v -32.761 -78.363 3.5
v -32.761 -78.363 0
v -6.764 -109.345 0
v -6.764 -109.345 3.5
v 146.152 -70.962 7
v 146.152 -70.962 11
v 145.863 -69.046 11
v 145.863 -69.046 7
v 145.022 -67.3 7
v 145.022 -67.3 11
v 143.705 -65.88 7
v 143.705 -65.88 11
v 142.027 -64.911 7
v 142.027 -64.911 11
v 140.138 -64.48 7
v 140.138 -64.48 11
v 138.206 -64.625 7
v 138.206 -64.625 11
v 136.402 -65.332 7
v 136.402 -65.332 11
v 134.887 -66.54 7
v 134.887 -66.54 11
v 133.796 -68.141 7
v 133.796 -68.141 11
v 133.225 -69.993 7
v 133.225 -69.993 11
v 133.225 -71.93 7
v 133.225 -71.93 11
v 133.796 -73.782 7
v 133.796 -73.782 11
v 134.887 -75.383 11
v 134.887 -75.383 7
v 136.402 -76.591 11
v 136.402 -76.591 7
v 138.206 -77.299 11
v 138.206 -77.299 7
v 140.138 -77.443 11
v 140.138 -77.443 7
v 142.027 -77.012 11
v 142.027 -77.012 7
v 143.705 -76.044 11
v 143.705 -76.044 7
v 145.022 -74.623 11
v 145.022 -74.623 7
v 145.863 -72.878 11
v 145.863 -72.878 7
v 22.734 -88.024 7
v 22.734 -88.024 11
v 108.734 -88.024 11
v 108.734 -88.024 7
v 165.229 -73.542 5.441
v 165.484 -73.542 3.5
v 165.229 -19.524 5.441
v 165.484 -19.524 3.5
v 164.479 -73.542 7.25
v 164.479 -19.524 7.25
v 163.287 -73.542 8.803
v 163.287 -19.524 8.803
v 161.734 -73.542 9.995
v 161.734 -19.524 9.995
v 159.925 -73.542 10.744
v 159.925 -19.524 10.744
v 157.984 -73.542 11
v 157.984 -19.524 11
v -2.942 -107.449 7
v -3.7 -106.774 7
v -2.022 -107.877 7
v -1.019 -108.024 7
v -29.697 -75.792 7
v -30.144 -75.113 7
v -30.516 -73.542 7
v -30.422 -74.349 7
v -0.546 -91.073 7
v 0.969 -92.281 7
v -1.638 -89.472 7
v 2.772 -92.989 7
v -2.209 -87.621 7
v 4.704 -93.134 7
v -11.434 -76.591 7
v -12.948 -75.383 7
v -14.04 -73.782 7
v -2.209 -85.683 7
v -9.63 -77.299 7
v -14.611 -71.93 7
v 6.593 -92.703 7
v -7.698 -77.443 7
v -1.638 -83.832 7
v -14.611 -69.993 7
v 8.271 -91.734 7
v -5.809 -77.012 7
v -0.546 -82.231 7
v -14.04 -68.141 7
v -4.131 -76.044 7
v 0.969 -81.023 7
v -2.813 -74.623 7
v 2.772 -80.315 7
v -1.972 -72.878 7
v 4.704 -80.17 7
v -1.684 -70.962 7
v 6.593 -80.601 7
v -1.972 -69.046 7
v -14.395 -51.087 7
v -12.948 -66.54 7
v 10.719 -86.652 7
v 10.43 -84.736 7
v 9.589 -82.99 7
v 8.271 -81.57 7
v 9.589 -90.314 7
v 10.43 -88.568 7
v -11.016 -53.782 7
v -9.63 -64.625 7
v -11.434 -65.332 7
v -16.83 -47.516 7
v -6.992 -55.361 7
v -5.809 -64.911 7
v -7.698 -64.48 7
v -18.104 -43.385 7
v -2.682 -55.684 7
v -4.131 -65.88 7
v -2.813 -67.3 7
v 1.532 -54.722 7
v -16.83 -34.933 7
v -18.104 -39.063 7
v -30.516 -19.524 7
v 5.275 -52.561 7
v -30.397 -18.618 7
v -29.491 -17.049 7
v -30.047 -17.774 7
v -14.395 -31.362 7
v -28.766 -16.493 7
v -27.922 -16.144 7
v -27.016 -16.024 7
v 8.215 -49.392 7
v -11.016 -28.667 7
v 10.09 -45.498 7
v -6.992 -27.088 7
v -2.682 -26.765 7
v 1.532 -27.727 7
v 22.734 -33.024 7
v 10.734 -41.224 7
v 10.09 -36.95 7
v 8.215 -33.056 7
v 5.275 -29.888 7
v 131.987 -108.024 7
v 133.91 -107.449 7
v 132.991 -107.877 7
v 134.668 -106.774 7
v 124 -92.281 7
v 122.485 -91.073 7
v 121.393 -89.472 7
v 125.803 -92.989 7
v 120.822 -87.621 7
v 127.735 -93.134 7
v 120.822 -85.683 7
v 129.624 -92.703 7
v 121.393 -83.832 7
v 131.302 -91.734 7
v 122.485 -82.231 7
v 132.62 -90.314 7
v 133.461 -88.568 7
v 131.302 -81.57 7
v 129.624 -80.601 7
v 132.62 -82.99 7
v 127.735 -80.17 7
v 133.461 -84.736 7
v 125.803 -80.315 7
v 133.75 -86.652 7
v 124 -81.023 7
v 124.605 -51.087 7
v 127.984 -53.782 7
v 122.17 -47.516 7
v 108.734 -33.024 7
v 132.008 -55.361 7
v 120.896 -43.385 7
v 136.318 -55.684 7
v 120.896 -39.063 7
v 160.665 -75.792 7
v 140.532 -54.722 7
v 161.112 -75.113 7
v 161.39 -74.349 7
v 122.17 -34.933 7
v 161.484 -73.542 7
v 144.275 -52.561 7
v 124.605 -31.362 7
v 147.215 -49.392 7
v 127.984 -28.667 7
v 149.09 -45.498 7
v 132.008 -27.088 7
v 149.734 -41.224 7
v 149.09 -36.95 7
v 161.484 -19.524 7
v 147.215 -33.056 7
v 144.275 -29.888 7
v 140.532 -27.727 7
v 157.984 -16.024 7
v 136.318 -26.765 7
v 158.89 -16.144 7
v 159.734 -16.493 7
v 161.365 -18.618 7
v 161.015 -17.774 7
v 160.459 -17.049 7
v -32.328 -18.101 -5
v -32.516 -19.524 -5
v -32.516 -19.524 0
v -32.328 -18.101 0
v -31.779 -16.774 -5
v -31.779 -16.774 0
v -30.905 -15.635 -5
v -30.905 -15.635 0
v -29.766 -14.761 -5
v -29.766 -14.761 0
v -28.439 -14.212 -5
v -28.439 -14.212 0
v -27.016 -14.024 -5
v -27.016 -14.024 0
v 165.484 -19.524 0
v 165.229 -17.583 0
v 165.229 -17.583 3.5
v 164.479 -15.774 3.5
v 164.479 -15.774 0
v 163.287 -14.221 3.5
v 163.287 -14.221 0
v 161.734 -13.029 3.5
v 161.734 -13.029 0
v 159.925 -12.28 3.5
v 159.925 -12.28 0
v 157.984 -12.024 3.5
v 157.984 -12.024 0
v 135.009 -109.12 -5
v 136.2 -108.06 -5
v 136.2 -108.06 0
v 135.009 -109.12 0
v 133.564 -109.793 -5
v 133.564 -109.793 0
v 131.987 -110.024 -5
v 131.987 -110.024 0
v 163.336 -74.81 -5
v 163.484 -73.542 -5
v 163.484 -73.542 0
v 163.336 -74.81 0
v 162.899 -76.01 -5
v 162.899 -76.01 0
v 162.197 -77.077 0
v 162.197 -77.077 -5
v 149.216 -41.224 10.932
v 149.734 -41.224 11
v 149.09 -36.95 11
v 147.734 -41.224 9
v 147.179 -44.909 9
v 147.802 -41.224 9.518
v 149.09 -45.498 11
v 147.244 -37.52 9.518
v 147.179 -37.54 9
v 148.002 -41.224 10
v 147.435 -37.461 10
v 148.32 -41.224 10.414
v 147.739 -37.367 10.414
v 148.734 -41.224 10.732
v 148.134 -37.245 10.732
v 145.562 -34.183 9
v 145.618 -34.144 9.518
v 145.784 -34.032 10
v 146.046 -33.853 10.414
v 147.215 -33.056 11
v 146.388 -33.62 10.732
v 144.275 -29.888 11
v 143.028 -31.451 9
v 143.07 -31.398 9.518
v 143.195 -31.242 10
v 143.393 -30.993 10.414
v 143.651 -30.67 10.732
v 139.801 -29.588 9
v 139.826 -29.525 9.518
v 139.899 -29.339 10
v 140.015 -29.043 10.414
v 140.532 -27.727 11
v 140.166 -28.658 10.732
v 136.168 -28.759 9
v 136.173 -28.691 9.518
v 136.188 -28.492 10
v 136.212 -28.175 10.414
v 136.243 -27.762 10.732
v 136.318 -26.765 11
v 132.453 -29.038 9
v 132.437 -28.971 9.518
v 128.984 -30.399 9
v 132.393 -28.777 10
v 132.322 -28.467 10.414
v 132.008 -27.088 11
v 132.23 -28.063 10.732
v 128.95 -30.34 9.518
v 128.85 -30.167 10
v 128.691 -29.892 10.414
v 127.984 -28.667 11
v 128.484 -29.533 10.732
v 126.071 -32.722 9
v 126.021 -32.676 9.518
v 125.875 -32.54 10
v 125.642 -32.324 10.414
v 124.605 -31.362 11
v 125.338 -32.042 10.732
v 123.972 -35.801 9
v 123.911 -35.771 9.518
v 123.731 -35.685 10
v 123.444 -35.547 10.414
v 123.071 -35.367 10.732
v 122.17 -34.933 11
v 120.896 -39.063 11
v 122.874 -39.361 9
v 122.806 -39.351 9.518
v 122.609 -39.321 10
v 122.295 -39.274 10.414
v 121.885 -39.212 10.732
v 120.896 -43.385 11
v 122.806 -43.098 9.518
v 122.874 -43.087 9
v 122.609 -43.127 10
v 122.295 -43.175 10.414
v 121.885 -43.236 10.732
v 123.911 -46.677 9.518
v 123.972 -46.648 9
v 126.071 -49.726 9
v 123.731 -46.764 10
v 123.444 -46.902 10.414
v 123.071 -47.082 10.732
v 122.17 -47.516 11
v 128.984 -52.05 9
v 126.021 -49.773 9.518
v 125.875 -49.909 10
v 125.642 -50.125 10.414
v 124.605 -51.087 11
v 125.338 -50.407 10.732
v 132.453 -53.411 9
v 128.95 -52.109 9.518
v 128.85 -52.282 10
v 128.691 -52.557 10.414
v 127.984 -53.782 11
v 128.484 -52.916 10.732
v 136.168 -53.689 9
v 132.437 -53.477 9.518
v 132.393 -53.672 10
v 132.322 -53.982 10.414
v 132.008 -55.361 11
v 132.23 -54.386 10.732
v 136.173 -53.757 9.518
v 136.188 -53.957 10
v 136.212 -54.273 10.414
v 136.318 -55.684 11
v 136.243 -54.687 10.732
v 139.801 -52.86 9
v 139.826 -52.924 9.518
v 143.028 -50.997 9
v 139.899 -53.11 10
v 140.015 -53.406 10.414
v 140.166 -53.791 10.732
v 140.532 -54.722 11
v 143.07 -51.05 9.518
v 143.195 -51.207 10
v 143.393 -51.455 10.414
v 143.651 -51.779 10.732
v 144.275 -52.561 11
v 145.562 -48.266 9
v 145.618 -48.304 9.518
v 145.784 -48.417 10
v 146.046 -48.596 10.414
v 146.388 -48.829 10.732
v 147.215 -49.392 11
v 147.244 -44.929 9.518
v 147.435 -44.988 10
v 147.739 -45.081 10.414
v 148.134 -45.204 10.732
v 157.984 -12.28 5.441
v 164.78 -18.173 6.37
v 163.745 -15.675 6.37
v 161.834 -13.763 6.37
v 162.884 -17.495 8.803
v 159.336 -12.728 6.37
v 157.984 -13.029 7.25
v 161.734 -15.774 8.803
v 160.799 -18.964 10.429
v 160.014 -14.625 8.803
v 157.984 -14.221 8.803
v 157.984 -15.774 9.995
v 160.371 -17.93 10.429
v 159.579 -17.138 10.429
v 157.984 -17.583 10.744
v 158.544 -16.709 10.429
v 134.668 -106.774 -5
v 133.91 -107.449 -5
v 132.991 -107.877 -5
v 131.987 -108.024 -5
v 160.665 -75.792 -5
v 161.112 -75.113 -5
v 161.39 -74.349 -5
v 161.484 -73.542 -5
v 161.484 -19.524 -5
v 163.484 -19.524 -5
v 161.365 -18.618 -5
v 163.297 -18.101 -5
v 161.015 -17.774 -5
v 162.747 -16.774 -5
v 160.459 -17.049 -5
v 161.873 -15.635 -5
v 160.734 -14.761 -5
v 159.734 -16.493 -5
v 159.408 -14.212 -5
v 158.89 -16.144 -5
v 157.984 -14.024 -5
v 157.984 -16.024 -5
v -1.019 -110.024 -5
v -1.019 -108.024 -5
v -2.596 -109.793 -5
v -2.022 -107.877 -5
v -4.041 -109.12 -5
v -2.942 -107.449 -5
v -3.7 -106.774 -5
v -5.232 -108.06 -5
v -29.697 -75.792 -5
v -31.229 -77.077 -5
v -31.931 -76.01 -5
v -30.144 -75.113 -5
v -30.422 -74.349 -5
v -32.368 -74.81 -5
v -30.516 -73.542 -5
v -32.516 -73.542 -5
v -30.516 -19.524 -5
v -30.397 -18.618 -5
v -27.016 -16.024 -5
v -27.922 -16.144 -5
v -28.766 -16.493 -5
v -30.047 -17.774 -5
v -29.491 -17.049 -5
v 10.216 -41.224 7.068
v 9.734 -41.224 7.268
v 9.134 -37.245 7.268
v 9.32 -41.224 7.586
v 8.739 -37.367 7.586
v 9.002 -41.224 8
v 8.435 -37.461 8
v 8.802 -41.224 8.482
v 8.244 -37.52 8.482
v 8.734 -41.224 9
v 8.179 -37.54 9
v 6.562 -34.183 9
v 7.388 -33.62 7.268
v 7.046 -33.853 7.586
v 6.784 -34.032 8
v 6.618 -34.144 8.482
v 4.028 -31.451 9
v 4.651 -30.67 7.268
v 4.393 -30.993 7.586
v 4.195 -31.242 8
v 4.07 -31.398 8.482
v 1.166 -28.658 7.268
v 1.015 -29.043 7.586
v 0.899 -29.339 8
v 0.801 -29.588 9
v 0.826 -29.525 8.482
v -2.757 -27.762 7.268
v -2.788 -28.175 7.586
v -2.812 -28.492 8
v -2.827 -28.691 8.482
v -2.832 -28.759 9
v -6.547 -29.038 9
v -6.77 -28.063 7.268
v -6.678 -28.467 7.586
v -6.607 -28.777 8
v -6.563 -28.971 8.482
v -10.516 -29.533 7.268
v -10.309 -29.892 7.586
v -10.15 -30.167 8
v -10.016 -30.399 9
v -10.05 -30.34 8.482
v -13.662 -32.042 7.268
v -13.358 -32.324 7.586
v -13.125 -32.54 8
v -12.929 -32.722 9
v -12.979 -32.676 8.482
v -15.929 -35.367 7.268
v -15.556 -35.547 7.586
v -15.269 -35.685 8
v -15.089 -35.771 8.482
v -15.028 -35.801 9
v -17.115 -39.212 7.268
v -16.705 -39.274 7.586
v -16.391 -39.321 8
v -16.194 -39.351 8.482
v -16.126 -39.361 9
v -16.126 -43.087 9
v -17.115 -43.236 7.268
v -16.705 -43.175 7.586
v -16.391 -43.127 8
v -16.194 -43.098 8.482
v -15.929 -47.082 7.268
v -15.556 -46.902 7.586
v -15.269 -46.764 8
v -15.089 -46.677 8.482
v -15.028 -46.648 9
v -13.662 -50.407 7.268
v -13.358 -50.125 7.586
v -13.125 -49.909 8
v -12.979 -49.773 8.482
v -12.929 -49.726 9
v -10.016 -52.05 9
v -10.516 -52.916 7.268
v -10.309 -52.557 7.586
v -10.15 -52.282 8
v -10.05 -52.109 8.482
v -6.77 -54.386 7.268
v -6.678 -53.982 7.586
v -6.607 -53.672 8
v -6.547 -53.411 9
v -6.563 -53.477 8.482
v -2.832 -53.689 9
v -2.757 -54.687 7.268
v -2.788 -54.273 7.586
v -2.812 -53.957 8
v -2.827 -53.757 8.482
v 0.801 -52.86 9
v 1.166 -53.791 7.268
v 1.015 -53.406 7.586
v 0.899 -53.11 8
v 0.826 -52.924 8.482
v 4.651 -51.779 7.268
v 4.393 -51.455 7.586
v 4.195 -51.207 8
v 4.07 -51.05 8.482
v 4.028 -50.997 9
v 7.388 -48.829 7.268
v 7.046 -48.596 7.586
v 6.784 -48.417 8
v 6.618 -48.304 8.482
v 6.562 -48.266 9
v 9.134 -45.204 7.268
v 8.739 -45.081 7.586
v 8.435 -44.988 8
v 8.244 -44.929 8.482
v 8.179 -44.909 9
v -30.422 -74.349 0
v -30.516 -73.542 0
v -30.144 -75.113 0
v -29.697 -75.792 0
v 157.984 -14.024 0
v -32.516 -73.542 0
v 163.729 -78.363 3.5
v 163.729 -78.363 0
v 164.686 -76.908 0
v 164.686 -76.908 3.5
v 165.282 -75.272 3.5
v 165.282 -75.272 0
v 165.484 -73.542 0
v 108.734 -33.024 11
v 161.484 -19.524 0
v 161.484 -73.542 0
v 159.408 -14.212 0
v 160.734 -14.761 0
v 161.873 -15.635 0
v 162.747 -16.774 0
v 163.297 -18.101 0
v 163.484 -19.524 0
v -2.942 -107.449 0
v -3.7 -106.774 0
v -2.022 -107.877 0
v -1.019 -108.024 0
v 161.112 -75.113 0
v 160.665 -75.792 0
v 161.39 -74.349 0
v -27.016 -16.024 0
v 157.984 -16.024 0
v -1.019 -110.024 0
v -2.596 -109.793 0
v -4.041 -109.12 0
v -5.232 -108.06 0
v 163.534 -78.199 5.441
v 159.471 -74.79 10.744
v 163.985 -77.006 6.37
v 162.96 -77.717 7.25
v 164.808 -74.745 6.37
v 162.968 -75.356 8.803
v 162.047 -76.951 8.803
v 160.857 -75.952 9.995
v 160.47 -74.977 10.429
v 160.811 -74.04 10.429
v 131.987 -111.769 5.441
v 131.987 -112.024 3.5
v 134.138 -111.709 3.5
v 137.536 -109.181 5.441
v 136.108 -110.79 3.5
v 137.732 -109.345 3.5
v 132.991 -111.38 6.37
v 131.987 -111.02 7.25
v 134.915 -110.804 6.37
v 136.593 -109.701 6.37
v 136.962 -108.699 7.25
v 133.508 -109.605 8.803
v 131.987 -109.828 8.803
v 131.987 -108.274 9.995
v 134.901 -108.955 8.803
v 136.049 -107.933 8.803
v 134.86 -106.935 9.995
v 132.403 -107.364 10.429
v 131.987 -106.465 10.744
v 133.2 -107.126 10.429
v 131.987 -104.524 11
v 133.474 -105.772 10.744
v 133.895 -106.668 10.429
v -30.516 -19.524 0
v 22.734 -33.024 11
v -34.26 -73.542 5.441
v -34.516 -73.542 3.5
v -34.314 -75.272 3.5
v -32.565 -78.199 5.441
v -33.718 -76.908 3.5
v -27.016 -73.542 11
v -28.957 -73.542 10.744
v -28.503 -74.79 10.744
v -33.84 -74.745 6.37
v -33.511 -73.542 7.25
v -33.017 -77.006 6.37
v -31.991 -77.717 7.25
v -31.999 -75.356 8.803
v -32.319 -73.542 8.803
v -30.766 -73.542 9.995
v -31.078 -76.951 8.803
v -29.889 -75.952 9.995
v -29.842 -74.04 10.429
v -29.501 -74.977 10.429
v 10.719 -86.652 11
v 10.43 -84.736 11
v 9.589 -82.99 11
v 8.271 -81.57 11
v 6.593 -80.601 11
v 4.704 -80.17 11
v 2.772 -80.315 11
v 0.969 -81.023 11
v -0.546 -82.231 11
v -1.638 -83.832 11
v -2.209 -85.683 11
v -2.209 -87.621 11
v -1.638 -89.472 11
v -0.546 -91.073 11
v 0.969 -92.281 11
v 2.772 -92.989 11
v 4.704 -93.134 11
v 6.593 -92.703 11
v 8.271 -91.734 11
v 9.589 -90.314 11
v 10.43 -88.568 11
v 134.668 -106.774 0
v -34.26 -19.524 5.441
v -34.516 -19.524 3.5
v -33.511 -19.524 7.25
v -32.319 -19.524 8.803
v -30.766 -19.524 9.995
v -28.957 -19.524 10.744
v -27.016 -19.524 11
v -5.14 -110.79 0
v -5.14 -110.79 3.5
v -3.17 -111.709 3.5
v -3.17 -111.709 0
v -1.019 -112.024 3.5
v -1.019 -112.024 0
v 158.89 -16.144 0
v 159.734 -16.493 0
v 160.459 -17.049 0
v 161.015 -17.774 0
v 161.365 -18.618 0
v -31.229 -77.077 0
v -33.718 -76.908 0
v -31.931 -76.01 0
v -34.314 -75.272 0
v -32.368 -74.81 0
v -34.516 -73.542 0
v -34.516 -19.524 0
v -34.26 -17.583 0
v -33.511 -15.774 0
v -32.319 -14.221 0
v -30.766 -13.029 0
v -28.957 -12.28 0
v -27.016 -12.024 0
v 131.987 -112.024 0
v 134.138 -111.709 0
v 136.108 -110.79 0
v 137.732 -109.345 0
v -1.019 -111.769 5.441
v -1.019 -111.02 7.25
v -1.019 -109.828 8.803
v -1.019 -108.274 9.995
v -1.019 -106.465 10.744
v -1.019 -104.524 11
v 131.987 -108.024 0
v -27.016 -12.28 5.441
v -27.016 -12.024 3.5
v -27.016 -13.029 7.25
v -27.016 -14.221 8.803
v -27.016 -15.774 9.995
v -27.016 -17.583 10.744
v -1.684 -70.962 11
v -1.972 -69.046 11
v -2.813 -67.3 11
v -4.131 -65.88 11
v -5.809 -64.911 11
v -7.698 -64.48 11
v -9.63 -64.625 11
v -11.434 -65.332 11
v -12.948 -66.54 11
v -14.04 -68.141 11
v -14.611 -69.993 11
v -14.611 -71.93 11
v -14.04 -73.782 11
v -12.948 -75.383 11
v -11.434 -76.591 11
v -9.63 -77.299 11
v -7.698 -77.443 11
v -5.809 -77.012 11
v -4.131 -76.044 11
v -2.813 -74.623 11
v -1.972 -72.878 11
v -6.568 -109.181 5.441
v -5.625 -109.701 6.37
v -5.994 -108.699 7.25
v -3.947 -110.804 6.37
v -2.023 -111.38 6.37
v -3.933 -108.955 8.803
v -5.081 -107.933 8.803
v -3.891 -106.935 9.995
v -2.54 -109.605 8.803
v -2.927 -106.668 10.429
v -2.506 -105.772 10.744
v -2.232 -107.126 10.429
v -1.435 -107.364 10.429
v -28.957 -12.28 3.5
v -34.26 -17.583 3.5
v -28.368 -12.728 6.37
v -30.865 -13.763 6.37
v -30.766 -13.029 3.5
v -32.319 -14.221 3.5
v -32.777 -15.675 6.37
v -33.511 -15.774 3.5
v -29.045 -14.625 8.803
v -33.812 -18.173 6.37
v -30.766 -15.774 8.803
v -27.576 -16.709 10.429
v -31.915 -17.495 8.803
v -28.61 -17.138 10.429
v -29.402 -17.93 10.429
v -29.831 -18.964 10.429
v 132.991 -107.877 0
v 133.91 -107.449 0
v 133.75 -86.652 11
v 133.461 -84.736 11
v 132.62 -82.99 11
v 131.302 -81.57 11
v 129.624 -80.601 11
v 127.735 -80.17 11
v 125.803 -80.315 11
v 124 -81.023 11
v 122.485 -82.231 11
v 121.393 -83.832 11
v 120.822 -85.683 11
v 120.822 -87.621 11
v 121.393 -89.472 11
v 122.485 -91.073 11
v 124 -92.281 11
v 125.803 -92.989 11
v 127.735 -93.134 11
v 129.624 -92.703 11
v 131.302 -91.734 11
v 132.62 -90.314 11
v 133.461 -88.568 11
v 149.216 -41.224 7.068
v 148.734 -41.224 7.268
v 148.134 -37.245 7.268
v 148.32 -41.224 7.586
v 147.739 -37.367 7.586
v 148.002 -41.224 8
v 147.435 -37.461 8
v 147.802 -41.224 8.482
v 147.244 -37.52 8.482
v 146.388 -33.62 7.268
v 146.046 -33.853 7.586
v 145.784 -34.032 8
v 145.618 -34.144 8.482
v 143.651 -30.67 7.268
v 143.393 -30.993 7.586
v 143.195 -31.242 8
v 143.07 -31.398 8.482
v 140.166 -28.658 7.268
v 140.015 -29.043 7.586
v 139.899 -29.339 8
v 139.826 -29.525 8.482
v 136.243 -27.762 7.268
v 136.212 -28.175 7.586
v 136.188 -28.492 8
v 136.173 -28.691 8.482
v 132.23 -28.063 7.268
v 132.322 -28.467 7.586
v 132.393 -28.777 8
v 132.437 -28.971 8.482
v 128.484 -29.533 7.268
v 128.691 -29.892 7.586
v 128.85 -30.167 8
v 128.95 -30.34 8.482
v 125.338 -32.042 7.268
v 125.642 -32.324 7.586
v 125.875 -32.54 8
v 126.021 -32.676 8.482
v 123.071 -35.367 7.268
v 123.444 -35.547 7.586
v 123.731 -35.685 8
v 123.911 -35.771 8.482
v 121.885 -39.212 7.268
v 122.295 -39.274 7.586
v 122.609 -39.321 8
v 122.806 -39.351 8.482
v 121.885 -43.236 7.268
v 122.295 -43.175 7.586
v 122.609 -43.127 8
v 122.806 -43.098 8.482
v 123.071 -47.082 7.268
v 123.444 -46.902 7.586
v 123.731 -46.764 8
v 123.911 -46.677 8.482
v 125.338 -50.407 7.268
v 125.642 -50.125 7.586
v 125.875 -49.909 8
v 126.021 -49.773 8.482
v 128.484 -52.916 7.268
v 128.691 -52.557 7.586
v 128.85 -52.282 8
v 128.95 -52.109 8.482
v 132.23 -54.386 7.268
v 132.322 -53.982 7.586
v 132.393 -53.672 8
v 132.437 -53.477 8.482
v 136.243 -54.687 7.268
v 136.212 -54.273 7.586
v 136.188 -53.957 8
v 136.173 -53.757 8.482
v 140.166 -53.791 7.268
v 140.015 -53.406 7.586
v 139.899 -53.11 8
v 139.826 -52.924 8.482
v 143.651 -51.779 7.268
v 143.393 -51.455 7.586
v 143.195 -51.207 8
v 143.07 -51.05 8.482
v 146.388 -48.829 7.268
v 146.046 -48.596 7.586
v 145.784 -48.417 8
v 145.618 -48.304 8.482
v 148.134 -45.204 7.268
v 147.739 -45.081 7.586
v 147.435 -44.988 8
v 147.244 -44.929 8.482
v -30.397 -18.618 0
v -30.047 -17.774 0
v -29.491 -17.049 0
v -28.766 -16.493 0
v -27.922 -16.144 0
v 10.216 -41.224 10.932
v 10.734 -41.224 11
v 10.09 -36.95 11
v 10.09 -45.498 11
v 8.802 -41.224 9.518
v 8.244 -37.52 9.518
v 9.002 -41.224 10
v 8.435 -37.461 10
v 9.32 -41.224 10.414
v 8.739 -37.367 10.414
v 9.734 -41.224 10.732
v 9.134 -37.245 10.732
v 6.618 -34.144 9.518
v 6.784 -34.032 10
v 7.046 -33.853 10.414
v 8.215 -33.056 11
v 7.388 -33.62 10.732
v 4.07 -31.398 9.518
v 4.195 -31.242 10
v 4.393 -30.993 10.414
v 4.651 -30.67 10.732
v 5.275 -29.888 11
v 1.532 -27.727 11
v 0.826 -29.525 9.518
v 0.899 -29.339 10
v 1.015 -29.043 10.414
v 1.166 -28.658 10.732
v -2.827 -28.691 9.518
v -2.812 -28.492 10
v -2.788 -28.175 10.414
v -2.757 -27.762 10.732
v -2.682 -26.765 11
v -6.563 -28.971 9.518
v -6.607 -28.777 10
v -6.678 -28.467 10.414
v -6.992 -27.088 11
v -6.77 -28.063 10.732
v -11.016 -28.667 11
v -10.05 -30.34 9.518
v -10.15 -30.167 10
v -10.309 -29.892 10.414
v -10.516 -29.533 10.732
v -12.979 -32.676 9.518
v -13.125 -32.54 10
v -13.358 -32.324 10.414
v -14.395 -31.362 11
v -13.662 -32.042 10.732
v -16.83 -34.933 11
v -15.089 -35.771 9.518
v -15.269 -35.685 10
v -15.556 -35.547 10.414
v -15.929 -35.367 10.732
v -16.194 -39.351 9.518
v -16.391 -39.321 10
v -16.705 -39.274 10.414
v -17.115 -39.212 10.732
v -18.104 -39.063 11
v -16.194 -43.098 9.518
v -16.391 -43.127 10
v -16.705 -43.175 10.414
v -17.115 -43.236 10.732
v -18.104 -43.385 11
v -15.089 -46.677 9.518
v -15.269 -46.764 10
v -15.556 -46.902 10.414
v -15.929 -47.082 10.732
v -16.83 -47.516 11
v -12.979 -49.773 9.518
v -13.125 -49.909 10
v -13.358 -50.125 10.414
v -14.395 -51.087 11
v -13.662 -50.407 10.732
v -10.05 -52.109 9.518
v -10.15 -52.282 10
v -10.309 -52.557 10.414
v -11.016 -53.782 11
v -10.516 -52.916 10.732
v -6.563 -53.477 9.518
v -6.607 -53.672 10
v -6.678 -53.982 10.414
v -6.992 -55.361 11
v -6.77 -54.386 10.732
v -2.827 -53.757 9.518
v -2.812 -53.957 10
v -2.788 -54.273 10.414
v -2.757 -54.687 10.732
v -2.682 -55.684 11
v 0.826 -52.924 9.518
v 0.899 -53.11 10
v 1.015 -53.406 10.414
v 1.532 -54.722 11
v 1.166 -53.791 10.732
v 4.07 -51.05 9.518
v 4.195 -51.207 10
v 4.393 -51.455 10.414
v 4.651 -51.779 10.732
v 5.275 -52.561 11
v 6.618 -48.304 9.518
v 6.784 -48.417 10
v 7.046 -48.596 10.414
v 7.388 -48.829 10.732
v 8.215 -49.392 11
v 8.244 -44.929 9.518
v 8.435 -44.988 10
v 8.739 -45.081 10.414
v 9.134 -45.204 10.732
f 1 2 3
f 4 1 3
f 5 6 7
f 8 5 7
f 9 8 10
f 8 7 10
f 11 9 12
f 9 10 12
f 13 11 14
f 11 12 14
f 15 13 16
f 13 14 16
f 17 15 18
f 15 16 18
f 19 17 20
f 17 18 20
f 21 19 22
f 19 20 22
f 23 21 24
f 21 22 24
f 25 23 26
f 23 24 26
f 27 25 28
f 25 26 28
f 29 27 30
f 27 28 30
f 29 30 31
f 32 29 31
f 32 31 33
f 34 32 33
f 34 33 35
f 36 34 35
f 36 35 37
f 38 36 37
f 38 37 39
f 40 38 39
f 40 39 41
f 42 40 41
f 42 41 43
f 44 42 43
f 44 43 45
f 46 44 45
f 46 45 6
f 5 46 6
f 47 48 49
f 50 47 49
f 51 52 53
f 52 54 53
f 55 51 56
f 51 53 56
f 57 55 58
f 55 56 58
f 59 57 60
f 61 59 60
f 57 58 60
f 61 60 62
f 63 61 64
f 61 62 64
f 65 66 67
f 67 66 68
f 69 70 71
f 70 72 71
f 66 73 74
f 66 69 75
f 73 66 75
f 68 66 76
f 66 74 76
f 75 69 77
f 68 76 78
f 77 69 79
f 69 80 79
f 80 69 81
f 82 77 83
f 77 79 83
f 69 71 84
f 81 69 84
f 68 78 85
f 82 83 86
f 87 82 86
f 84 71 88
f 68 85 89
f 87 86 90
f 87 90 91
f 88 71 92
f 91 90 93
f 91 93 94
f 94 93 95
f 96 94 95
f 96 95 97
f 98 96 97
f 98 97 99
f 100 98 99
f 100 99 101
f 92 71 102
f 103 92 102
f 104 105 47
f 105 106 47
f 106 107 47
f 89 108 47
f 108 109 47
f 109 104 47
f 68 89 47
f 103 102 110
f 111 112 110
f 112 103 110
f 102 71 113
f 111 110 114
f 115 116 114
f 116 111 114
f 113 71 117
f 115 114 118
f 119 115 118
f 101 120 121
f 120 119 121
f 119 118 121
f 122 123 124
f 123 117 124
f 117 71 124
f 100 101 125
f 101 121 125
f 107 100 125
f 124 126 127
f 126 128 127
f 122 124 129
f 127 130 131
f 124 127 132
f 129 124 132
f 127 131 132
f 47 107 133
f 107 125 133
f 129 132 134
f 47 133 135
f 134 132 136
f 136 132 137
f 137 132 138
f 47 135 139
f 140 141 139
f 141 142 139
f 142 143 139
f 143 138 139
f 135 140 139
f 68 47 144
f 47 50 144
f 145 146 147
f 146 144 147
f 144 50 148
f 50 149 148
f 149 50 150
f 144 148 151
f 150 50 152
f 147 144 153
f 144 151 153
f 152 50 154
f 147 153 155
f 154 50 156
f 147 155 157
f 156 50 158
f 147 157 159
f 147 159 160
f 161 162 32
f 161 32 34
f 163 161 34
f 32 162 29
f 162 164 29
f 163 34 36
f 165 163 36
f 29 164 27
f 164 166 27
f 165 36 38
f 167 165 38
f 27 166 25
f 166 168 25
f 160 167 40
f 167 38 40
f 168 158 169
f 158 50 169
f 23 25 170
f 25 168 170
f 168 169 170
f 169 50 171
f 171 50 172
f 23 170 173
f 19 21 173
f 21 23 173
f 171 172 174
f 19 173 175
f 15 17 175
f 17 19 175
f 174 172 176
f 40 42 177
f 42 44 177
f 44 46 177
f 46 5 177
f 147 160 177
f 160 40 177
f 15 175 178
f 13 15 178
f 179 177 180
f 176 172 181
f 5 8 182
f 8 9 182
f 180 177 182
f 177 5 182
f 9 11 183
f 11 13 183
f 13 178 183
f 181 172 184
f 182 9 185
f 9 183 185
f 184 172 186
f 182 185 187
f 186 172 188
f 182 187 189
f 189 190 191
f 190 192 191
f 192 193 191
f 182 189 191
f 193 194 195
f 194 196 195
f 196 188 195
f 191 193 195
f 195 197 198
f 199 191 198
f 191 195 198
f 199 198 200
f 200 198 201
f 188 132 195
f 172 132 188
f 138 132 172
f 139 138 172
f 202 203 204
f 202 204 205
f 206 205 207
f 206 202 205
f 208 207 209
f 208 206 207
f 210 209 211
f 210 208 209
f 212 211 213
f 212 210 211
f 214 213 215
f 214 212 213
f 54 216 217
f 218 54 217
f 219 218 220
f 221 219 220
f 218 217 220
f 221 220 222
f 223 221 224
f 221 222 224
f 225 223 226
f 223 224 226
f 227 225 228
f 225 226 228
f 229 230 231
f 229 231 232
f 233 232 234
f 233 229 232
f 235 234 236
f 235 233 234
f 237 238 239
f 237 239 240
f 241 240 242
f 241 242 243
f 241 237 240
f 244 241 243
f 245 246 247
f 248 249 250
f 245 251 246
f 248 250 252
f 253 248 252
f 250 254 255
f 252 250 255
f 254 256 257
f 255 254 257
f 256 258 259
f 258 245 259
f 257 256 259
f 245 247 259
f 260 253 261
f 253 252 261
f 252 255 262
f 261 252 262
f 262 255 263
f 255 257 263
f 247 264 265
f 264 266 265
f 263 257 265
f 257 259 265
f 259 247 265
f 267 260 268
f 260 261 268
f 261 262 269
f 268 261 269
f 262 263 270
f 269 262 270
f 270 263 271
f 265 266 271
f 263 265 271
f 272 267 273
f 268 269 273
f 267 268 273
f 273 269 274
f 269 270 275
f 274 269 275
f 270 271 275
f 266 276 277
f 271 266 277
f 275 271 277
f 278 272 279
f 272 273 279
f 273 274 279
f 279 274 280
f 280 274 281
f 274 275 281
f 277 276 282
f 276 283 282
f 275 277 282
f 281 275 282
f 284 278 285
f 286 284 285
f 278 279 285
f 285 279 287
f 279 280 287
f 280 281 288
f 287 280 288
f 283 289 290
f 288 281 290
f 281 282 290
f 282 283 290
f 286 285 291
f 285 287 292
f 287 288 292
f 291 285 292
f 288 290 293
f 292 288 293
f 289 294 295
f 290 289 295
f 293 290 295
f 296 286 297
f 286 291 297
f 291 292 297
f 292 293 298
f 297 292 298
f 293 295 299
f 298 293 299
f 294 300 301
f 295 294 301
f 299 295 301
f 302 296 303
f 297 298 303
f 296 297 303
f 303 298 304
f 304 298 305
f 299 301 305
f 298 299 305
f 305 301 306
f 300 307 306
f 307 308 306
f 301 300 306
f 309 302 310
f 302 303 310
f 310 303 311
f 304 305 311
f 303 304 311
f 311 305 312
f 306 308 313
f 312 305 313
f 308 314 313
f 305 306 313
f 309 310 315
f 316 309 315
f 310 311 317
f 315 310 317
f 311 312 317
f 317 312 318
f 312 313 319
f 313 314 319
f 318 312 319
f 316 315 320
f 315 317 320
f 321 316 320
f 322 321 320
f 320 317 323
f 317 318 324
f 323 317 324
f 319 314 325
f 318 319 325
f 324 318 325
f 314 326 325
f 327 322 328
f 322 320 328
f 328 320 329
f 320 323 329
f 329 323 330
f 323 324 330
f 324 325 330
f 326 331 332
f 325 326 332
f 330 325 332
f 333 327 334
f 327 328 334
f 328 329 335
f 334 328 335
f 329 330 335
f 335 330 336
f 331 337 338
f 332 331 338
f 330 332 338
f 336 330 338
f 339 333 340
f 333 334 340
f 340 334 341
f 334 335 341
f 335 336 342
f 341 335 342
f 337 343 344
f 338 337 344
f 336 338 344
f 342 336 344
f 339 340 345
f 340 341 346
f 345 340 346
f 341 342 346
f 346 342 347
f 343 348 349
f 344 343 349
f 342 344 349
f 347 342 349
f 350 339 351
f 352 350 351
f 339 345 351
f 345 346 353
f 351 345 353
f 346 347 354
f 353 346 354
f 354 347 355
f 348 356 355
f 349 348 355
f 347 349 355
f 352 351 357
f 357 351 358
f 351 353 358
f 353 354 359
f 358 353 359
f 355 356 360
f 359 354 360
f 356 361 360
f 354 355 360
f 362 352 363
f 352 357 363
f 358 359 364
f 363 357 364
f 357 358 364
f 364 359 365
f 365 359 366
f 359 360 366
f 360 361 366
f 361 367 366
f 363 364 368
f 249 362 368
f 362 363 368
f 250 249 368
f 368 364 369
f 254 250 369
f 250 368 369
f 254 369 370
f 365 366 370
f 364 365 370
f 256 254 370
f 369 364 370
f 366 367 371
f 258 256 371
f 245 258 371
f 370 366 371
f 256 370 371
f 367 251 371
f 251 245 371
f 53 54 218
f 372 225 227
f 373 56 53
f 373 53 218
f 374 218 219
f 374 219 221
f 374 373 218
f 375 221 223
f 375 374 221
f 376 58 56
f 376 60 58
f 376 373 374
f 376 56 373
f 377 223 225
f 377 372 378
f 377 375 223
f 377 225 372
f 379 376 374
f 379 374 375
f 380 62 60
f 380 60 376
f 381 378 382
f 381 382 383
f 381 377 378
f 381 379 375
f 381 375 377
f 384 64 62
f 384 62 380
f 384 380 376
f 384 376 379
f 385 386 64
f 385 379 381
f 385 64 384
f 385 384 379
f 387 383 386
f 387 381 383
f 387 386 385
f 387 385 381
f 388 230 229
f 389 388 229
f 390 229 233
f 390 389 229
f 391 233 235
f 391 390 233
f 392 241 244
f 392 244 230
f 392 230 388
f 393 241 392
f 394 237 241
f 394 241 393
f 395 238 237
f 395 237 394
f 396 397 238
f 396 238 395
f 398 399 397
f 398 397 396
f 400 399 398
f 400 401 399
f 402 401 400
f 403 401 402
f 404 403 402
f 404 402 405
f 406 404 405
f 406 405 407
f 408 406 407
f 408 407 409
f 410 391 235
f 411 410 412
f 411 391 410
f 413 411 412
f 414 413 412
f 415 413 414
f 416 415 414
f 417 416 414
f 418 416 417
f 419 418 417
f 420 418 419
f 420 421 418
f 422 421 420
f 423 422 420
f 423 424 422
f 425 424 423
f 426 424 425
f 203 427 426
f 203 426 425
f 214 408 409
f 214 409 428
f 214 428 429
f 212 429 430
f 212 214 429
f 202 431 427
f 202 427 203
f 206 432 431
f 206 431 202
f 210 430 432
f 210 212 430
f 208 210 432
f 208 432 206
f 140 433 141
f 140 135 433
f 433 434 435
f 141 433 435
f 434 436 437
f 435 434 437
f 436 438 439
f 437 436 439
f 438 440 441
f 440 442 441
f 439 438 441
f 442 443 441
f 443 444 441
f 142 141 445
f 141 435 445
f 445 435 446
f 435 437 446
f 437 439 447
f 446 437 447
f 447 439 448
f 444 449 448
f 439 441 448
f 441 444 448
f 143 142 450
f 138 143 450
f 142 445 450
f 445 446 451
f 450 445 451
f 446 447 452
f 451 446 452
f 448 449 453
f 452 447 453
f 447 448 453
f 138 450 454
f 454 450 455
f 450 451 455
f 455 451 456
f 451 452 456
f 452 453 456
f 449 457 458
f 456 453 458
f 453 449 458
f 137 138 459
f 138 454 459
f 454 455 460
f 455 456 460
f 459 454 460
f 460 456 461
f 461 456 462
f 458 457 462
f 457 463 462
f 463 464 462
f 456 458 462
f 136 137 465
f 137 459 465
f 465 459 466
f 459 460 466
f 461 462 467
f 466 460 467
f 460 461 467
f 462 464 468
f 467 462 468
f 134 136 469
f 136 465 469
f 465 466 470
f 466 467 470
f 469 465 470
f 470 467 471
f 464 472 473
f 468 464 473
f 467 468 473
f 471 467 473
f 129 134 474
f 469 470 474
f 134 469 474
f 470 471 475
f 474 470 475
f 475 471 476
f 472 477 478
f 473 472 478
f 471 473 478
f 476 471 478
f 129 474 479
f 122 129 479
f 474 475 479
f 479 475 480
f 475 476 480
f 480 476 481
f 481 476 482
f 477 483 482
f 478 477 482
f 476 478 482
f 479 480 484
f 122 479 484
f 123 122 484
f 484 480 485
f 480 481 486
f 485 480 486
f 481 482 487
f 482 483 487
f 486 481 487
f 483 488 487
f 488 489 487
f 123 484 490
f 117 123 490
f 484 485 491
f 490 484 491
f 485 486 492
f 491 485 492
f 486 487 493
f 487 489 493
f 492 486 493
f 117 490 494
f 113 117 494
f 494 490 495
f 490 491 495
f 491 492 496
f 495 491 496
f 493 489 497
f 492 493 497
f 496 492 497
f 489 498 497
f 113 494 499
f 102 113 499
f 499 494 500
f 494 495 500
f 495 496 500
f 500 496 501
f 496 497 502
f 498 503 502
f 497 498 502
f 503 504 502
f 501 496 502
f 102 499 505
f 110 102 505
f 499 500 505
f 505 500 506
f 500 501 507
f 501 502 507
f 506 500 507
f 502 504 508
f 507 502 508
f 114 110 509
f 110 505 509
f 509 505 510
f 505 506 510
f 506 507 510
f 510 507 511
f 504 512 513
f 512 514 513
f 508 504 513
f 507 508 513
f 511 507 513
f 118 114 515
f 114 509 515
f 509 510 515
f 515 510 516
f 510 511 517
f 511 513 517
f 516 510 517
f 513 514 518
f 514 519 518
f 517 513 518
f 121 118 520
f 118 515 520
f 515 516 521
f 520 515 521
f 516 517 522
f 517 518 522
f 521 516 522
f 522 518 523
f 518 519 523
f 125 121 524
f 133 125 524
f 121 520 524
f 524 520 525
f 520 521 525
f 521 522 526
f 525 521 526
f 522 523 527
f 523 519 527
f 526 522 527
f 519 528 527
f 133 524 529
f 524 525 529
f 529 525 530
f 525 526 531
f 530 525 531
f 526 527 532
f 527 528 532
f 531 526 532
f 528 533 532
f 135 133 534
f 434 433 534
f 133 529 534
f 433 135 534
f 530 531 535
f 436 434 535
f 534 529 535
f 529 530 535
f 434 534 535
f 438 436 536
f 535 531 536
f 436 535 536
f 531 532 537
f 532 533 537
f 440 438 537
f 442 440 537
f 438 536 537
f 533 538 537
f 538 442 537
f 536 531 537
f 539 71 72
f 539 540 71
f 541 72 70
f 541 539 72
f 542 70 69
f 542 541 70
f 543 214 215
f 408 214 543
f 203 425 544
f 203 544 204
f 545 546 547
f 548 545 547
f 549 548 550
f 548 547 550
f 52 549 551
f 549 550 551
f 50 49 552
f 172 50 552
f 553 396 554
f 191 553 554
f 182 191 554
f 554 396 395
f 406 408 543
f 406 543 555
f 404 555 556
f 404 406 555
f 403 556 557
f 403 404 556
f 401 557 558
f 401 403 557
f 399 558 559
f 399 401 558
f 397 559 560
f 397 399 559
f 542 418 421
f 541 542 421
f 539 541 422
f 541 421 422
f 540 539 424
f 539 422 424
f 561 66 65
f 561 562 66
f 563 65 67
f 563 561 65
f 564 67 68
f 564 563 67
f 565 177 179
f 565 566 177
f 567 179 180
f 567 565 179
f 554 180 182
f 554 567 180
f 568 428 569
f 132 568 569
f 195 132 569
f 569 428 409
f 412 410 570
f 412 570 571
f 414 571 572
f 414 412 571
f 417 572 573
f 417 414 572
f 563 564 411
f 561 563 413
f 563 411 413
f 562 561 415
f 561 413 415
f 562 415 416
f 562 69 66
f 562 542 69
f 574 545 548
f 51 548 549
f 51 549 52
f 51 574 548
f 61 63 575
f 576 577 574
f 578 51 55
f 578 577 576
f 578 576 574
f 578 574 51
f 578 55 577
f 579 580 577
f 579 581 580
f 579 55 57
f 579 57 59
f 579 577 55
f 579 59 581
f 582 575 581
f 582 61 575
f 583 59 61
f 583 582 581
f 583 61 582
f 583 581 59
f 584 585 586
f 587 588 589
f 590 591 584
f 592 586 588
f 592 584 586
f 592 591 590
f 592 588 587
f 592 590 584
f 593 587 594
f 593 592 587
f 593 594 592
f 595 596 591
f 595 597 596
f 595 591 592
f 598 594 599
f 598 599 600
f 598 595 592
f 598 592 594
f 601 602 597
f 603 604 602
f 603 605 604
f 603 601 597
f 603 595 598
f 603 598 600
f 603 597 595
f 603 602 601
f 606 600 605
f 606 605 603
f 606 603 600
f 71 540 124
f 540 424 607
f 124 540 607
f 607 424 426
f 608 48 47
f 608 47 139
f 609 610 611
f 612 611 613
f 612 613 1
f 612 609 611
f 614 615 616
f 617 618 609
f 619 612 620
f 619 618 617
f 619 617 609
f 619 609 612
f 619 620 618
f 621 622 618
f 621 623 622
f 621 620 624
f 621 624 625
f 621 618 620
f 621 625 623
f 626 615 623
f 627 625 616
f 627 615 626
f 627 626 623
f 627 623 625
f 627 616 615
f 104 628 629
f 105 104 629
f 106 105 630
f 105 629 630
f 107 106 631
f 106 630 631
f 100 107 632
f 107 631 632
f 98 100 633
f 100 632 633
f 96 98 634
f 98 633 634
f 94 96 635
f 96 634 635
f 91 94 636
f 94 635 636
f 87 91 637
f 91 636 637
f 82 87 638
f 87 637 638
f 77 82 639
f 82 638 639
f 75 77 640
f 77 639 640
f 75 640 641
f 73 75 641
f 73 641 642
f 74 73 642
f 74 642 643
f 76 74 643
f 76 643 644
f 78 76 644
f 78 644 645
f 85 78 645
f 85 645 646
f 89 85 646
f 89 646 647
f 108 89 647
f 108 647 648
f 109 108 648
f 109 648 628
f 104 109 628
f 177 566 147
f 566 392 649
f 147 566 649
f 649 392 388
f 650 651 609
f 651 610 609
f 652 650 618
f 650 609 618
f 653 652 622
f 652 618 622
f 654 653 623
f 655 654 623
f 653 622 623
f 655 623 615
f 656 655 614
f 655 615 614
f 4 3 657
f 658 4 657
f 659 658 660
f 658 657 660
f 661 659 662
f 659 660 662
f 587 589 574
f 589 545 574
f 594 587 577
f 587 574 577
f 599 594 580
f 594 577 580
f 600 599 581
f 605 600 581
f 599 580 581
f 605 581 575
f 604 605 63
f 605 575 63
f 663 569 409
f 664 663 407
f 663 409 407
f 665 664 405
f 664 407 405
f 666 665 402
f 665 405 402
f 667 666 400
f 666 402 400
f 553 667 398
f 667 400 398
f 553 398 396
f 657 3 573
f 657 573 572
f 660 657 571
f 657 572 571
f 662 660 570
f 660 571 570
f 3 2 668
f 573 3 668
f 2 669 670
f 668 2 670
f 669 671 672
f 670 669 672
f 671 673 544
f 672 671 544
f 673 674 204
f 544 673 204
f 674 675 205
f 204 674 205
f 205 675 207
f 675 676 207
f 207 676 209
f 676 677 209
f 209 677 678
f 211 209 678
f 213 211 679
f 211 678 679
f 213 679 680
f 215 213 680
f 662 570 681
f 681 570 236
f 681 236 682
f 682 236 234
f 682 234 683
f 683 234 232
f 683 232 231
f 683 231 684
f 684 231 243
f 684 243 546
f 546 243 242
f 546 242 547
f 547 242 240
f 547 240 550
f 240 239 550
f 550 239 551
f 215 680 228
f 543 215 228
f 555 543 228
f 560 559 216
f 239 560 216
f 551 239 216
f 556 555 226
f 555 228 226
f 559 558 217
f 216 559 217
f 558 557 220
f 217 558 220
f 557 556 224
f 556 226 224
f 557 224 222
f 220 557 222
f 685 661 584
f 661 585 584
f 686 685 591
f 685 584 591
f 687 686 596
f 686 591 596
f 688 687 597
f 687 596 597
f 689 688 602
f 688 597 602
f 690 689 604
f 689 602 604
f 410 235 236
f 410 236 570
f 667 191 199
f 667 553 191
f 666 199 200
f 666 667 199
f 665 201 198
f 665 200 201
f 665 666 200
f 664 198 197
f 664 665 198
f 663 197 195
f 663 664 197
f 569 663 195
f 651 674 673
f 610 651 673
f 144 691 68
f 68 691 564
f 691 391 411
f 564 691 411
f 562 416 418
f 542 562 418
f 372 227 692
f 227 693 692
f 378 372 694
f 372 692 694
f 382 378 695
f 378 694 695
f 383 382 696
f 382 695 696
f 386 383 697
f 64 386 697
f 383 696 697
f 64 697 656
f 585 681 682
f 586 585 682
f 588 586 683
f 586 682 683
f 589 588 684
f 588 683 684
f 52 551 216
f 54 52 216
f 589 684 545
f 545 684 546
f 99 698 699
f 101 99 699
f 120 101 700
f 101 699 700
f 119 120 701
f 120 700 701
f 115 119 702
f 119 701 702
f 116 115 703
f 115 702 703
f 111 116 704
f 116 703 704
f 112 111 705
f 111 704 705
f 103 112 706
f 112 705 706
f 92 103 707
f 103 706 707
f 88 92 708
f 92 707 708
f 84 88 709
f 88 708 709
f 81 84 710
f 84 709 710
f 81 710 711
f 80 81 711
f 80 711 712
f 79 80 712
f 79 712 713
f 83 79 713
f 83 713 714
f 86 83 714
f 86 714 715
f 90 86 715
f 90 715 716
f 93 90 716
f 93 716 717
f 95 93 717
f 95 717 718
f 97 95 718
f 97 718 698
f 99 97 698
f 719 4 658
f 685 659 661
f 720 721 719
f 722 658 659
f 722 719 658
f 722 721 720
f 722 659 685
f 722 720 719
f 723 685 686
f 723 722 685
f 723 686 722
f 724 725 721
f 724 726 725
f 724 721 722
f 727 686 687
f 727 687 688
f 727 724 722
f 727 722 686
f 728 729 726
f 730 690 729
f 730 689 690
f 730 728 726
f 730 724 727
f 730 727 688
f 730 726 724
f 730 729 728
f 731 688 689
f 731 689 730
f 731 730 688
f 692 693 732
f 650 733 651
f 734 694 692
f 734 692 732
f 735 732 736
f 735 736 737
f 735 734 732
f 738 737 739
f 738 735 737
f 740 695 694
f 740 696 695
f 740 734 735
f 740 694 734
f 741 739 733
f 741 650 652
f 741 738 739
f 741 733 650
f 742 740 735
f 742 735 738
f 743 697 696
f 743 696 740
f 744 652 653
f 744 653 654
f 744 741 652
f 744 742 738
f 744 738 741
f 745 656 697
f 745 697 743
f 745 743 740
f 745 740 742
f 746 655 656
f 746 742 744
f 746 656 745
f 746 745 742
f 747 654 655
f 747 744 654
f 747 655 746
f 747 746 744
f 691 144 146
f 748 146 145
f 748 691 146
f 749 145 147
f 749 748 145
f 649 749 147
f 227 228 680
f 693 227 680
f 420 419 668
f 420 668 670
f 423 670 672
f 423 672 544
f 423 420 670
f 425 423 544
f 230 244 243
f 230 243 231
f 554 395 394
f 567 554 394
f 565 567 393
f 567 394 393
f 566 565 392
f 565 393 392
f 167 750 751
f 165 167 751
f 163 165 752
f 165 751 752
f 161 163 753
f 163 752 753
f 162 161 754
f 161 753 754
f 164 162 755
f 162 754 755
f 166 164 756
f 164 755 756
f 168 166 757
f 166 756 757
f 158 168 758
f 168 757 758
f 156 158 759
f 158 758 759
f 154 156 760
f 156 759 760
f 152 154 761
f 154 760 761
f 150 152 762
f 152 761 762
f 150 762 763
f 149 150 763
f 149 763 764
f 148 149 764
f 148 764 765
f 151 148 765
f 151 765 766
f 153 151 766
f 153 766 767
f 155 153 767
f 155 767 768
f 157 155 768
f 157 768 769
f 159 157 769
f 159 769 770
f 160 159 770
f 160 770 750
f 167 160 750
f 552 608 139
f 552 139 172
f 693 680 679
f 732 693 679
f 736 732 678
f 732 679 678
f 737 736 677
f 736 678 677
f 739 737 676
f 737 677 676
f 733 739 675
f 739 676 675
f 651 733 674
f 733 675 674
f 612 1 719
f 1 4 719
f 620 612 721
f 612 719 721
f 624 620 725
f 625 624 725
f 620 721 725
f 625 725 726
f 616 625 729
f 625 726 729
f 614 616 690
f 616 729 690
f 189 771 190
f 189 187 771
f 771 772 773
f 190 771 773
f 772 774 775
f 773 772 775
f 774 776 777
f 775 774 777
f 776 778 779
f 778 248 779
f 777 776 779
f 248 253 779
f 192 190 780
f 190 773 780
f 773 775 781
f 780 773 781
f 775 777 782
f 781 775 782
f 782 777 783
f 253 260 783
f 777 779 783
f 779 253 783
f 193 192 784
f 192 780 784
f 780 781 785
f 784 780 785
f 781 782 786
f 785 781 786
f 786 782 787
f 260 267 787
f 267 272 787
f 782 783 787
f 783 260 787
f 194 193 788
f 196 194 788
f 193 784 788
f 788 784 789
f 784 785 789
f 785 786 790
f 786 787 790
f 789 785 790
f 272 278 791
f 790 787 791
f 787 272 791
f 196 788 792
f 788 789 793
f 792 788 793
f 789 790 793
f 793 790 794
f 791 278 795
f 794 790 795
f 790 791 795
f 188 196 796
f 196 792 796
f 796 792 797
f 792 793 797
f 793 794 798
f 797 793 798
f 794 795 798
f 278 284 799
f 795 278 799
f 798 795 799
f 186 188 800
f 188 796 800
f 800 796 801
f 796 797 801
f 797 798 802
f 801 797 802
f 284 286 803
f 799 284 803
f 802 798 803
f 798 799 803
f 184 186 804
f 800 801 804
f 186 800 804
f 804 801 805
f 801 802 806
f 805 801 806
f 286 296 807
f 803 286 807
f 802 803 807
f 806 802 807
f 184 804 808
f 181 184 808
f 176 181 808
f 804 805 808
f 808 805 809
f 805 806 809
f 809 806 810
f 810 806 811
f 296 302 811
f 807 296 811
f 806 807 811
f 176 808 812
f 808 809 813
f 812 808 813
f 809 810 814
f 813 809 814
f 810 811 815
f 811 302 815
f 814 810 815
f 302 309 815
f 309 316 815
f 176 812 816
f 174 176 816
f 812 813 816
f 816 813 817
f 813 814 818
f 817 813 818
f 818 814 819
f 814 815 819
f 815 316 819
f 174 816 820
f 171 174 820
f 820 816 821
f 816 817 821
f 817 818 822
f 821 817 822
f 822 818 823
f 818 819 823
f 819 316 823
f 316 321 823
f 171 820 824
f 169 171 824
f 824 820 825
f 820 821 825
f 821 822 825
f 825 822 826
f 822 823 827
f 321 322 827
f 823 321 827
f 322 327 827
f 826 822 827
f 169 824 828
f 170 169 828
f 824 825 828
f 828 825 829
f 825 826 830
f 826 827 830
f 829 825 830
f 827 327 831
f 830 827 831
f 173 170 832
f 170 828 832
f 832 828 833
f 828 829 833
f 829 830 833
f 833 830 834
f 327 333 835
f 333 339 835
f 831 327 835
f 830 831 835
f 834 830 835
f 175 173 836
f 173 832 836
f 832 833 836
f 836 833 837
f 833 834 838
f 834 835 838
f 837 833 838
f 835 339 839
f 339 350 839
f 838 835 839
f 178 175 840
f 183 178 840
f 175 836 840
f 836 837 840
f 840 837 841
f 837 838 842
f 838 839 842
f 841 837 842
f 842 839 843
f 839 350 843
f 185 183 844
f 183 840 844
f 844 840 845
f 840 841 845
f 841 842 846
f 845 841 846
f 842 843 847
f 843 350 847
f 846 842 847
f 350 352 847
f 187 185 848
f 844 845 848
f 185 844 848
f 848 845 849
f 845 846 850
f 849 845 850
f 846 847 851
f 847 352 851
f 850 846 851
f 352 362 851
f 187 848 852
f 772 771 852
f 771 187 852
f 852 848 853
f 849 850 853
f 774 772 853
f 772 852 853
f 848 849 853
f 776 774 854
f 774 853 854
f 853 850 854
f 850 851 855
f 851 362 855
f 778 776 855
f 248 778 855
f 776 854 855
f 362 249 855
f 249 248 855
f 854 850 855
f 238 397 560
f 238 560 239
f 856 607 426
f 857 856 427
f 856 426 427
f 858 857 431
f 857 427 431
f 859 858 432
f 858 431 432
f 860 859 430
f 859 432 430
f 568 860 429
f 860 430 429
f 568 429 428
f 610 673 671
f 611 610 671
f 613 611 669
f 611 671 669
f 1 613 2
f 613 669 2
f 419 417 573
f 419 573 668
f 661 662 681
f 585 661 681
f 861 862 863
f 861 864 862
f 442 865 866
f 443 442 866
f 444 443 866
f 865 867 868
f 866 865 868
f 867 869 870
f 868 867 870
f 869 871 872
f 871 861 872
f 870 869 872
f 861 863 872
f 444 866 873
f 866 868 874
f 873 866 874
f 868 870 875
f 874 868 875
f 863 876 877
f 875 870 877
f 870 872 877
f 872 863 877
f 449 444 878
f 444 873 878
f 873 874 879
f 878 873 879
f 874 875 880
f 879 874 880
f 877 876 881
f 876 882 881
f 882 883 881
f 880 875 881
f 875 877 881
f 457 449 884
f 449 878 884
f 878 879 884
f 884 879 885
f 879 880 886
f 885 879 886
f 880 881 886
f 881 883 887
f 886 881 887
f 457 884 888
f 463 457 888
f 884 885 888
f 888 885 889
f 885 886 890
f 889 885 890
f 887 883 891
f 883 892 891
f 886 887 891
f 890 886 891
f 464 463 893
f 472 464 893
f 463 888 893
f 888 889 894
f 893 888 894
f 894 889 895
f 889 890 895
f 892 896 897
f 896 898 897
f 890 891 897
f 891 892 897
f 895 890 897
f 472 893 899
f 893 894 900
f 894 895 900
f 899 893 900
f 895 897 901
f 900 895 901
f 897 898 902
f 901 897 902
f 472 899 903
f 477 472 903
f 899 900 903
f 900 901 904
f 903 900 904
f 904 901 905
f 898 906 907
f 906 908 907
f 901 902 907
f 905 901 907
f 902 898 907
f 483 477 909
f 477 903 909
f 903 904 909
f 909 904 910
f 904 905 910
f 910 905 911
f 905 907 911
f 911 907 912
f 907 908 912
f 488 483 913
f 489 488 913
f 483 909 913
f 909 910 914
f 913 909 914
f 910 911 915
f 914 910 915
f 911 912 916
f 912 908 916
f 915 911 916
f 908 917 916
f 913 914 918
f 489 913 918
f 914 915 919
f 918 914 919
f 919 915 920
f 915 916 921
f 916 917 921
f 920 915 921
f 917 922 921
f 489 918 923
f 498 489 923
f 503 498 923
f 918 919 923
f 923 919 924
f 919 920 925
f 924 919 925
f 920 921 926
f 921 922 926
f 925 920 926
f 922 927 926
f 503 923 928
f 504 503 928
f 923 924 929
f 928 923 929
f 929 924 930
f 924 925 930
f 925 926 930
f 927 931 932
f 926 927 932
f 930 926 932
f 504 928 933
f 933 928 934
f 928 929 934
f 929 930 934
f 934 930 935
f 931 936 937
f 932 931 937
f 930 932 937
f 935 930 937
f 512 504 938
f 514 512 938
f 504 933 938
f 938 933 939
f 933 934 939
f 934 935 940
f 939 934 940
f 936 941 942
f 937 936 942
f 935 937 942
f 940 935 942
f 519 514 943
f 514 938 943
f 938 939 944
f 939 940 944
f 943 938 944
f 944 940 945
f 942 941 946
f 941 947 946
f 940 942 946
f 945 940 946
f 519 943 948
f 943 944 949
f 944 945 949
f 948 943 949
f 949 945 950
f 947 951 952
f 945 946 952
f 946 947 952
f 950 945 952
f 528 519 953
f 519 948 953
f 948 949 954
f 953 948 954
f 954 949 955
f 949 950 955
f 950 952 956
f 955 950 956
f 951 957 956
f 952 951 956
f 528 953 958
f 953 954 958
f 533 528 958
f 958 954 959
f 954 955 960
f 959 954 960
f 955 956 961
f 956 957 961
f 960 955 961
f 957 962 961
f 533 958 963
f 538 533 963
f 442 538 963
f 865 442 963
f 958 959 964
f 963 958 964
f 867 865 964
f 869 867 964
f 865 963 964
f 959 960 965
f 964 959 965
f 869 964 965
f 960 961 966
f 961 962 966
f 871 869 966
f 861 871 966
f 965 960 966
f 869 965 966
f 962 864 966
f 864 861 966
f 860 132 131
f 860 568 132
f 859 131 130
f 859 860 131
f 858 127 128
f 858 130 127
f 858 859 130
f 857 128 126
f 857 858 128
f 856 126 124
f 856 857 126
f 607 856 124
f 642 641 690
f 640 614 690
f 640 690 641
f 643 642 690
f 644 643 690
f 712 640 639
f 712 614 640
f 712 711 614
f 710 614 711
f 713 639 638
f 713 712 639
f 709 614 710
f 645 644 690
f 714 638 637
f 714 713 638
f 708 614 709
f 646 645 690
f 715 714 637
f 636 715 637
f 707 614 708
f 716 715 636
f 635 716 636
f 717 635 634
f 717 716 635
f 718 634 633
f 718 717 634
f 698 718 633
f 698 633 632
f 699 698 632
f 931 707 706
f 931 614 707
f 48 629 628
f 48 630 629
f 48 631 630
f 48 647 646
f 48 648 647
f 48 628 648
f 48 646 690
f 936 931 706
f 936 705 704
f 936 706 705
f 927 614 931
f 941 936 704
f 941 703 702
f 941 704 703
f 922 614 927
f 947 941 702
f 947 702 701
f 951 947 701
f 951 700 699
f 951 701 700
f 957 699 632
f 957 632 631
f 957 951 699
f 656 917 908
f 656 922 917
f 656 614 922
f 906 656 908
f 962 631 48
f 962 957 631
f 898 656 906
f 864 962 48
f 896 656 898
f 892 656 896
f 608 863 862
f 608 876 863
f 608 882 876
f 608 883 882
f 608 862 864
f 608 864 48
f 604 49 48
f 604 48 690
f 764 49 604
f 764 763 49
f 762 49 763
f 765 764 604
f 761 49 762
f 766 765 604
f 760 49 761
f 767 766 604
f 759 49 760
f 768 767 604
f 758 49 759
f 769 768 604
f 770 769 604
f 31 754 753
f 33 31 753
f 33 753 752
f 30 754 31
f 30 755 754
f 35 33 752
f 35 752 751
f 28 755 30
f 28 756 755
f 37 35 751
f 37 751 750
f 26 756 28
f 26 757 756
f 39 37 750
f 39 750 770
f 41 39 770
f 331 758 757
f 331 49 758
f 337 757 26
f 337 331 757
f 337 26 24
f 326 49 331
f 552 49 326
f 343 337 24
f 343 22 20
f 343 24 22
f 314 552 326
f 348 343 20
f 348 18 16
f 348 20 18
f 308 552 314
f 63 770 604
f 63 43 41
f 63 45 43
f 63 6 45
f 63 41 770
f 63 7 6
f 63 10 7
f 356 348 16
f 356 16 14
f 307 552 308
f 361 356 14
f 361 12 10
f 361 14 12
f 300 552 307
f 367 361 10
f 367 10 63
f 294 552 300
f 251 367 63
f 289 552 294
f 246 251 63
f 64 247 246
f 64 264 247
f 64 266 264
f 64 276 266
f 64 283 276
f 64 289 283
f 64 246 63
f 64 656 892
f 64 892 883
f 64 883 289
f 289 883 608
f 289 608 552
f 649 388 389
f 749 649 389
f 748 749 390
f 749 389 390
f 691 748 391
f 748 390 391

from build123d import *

# Parameters (mm, degrees)
BOSS_EXTRUDE1_DEPTH = 11
SHELL1_T            = -4
FILLET1_R           = 7.5
BOSS_EXTRUDE2_START = 5
BOSS_EXTRUDE2_DEPTH = 5
SKETCH3_W           = 86
SKETCH3_H           = 55
CUT_EXTRUDE1_DEPTH  = 10
SKETCH4_R           = 12.5
SKETCH4_R_2         = 6.5
CUT_EXTRUDE2_DEPTH  = 10
FILLET2_R           = 2


with BuildPart() as part:
    # Sketch1 → Boss-Extrude1 (new body)
    with BuildSketch(Plane.XY):
        with BuildLine():
            Line((-32.761189707, -78.36284634), (-6.76388227, -109.345230875))
            ThreePointArc((-6.76388227, -109.345230875), (-4.18818591, -111.321632205), (-1.018548947, -112.024323803))
            Line((-1.018548947, -112.024323803), (131.986836181, -112.024323803))
            ThreePointArc((131.986836181, -112.024323803), (135.156473144, -111.321632205), (137.732169504, -109.345230875))
            Line((137.732169504, -109.345230875), (163.72947694, -78.36284634))
            ThreePointArc((163.72947694, -78.36284634), (165.031838273, -76.107090343), (165.484143617, -73.541939268))
            Line((165.484143617, -73.541939268), (165.484143617, -19.524323803))
            ThreePointArc((165.484143617, -19.524323803), (163.287444476, -14.221022944), (157.984143617, -12.024323803))
            Line((157.984143617, -12.024323803), (-27.015856383, -12.024323803))
            ThreePointArc((-27.015856383, -12.024323803), (-32.319157242, -14.221022944), (-34.515856383, -19.524323803))
            Line((-34.515856383, -19.524323803), (-34.515856383, -73.541939268))
            ThreePointArc((-34.515856383, -73.541939268), (-34.063551039, -76.107090343), (-32.761189707, -78.36284634))
        make_face()
    extrude(amount=BOSS_EXTRUDE1_DEPTH)

    # Shell1
    shell1_openings = [part.faces().sort_by_distance(p)[0] for p in [
        (65.484143617, -59.914594693, 0),
    ]]
    offset(amount=SHELL1_T, openings=shell1_openings, kind=Kind.INTERSECTION)

    # Fillet1
    fillet1_edges = [part.edges().sort_by_distance(p)[0] for p in [
        (135.156473144, -111.321632205, 11),
        (150.730823222, -93.854038608, 11),
        (165.031838273, -76.107090343, 11),
        (165.484143617, -46.533131535, 11),
        (163.287444476, -14.221022944, 11),
        (65.484143617, -12.024323803, 11),
        (-32.319157242, -14.221022944, 11),
        (-34.515856383, -46.533131535, 11),
        (-34.063551039, -76.107090343, 11),
        (-19.762535988, -93.854038608, 11),
        (-4.18818591, -111.321632205, 11),
        (65.484143617, -112.024323803, 11),
    ]]
    fillet(fillet1_edges, radius=FILLET1_R)

    # Sketch2 → Boss-Extrude2 (add)
    with BuildSketch(Plane(origin=(0, 0, 0), x_dir=(-1, 0, 0), z_dir=(0, 0, -1)).offset(BOSS_EXTRUDE2_START)):
        with BuildLine():
            Line((5.231793384, -108.059655656), (31.22910082, -77.077271121))
            ThreePointArc((31.22910082, -77.077271121), (32.184165797, -75.423050056), (32.515856383, -73.541939268))
            Line((32.515856383, -73.541939268), (32.515856383, -19.524323803))
            ThreePointArc((32.515856383, -19.524323803), (30.90494368, -15.635236506), (27.015856383, -14.024323803))
            Line((27.015856383, -14.024323803), (-157.984143617, -14.024323803))
            ThreePointArc((-157.984143617, -14.024323803), (-161.873230913, -15.635236506), (-163.484143617, -19.524323803))
            Line((-163.484143617, -19.524323803), (-163.484143617, -73.541939268))
            ThreePointArc((-163.484143617, -73.541939268), (-163.152453031, -75.423050056), (-162.197388054, -77.077271121))
            Line((-162.197388054, -77.077271121), (-136.200080618, -108.059655656))
            ThreePointArc((-136.200080618, -108.059655656), (-134.31123662, -109.509016631), (-131.986836181, -110.024323803))
            Line((-131.986836181, -110.024323803), (1.018548947, -110.024323803))
            ThreePointArc((1.018548947, -110.024323803), (3.342949387, -109.509016631), (5.231793384, -108.059655656))
        make_face()
        with BuildLine():
            Line((3.699704498, -106.774080437), (29.697011934, -75.791695902))
            ThreePointArc((29.697011934, -75.791695902), (30.304780556, -74.739009769), (30.515856383, -73.541939268))
            Line((30.515856383, -73.541939268), (30.515856383, -19.524323803))
            ThreePointArc((30.515856383, -19.524323803), (29.490730117, -17.049450068), (27.015856383, -16.024323803))
            Line((27.015856383, -16.024323803), (-157.984143617, -16.024323803))
            ThreePointArc((-157.984143617, -16.024323803), (-160.459017351, -17.049450068), (-161.484143617, -19.524323803))
            Line((-161.484143617, -19.524323803), (-161.484143617, -73.541939268))
            ThreePointArc((-161.484143617, -73.541939268), (-161.27306779, -74.739009769), (-160.665299168, -75.791695902))
            Line((-160.665299168, -75.791695902), (-134.667991732, -106.774080437))
            ThreePointArc((-134.667991732, -106.774080437), (-133.466000097, -107.696401057), (-131.986836181, -108.024323803))
            Line((-131.986836181, -108.024323803), (1.018548947, -108.024323803))
            ThreePointArc((1.018548947, -108.024323803), (2.497712863, -107.696401057), (3.699704498, -106.774080437))
        make_face(mode=Mode.SUBTRACT)
    extrude(amount=-BOSS_EXTRUDE2_DEPTH)

    # Sketch3 → Cut-Extrude1 (cut)
    with BuildSketch(Plane.XY.offset(11)):
        with Locations((65.734143617, -60.524323803)):
            Rectangle(SKETCH3_W, SKETCH3_H)
    extrude(amount=-CUT_EXTRUDE1_DEPTH, mode=Mode.SUBTRACT)

    # Sketch4 → Cut-Extrude2 (cut)
    with BuildSketch(Plane.XY.offset(11)):
        with Locations((-3.765856383, -41.224323803)):
            Circle(SKETCH4_R)
        with Locations((-8.183616573, -70.961609401)):
            Circle(SKETCH4_R_2)
        with Locations((4.218548656, -86.65193437)):
            Circle(SKETCH4_R_2)
        with Locations((127.249738577, -86.65193437)):
            Circle(SKETCH4_R_2)
        with Locations((139.651903807, -70.961609401)):
            Circle(SKETCH4_R_2)
        with Locations((135.234143617, -41.224323803)):
            Circle(SKETCH4_R)
    extrude(amount=-CUT_EXTRUDE2_DEPTH, mode=Mode.SUBTRACT)

    # Fillet2
    fillet2_edges = [part.edges().sort_by_distance(p)[0] for p in [
        (122.734143617, -41.224323803, 7),
        (122.734143617, -41.224323803, 11),
        (-16.265856383, -41.224323803, 7),
        (-16.265856383, -41.224323803, 11),
    ]]
    fillet(fillet2_edges, radius=FILLET2_R - 0.0001)  # a hair under: the kernel refuses the full size


solid = part.part
